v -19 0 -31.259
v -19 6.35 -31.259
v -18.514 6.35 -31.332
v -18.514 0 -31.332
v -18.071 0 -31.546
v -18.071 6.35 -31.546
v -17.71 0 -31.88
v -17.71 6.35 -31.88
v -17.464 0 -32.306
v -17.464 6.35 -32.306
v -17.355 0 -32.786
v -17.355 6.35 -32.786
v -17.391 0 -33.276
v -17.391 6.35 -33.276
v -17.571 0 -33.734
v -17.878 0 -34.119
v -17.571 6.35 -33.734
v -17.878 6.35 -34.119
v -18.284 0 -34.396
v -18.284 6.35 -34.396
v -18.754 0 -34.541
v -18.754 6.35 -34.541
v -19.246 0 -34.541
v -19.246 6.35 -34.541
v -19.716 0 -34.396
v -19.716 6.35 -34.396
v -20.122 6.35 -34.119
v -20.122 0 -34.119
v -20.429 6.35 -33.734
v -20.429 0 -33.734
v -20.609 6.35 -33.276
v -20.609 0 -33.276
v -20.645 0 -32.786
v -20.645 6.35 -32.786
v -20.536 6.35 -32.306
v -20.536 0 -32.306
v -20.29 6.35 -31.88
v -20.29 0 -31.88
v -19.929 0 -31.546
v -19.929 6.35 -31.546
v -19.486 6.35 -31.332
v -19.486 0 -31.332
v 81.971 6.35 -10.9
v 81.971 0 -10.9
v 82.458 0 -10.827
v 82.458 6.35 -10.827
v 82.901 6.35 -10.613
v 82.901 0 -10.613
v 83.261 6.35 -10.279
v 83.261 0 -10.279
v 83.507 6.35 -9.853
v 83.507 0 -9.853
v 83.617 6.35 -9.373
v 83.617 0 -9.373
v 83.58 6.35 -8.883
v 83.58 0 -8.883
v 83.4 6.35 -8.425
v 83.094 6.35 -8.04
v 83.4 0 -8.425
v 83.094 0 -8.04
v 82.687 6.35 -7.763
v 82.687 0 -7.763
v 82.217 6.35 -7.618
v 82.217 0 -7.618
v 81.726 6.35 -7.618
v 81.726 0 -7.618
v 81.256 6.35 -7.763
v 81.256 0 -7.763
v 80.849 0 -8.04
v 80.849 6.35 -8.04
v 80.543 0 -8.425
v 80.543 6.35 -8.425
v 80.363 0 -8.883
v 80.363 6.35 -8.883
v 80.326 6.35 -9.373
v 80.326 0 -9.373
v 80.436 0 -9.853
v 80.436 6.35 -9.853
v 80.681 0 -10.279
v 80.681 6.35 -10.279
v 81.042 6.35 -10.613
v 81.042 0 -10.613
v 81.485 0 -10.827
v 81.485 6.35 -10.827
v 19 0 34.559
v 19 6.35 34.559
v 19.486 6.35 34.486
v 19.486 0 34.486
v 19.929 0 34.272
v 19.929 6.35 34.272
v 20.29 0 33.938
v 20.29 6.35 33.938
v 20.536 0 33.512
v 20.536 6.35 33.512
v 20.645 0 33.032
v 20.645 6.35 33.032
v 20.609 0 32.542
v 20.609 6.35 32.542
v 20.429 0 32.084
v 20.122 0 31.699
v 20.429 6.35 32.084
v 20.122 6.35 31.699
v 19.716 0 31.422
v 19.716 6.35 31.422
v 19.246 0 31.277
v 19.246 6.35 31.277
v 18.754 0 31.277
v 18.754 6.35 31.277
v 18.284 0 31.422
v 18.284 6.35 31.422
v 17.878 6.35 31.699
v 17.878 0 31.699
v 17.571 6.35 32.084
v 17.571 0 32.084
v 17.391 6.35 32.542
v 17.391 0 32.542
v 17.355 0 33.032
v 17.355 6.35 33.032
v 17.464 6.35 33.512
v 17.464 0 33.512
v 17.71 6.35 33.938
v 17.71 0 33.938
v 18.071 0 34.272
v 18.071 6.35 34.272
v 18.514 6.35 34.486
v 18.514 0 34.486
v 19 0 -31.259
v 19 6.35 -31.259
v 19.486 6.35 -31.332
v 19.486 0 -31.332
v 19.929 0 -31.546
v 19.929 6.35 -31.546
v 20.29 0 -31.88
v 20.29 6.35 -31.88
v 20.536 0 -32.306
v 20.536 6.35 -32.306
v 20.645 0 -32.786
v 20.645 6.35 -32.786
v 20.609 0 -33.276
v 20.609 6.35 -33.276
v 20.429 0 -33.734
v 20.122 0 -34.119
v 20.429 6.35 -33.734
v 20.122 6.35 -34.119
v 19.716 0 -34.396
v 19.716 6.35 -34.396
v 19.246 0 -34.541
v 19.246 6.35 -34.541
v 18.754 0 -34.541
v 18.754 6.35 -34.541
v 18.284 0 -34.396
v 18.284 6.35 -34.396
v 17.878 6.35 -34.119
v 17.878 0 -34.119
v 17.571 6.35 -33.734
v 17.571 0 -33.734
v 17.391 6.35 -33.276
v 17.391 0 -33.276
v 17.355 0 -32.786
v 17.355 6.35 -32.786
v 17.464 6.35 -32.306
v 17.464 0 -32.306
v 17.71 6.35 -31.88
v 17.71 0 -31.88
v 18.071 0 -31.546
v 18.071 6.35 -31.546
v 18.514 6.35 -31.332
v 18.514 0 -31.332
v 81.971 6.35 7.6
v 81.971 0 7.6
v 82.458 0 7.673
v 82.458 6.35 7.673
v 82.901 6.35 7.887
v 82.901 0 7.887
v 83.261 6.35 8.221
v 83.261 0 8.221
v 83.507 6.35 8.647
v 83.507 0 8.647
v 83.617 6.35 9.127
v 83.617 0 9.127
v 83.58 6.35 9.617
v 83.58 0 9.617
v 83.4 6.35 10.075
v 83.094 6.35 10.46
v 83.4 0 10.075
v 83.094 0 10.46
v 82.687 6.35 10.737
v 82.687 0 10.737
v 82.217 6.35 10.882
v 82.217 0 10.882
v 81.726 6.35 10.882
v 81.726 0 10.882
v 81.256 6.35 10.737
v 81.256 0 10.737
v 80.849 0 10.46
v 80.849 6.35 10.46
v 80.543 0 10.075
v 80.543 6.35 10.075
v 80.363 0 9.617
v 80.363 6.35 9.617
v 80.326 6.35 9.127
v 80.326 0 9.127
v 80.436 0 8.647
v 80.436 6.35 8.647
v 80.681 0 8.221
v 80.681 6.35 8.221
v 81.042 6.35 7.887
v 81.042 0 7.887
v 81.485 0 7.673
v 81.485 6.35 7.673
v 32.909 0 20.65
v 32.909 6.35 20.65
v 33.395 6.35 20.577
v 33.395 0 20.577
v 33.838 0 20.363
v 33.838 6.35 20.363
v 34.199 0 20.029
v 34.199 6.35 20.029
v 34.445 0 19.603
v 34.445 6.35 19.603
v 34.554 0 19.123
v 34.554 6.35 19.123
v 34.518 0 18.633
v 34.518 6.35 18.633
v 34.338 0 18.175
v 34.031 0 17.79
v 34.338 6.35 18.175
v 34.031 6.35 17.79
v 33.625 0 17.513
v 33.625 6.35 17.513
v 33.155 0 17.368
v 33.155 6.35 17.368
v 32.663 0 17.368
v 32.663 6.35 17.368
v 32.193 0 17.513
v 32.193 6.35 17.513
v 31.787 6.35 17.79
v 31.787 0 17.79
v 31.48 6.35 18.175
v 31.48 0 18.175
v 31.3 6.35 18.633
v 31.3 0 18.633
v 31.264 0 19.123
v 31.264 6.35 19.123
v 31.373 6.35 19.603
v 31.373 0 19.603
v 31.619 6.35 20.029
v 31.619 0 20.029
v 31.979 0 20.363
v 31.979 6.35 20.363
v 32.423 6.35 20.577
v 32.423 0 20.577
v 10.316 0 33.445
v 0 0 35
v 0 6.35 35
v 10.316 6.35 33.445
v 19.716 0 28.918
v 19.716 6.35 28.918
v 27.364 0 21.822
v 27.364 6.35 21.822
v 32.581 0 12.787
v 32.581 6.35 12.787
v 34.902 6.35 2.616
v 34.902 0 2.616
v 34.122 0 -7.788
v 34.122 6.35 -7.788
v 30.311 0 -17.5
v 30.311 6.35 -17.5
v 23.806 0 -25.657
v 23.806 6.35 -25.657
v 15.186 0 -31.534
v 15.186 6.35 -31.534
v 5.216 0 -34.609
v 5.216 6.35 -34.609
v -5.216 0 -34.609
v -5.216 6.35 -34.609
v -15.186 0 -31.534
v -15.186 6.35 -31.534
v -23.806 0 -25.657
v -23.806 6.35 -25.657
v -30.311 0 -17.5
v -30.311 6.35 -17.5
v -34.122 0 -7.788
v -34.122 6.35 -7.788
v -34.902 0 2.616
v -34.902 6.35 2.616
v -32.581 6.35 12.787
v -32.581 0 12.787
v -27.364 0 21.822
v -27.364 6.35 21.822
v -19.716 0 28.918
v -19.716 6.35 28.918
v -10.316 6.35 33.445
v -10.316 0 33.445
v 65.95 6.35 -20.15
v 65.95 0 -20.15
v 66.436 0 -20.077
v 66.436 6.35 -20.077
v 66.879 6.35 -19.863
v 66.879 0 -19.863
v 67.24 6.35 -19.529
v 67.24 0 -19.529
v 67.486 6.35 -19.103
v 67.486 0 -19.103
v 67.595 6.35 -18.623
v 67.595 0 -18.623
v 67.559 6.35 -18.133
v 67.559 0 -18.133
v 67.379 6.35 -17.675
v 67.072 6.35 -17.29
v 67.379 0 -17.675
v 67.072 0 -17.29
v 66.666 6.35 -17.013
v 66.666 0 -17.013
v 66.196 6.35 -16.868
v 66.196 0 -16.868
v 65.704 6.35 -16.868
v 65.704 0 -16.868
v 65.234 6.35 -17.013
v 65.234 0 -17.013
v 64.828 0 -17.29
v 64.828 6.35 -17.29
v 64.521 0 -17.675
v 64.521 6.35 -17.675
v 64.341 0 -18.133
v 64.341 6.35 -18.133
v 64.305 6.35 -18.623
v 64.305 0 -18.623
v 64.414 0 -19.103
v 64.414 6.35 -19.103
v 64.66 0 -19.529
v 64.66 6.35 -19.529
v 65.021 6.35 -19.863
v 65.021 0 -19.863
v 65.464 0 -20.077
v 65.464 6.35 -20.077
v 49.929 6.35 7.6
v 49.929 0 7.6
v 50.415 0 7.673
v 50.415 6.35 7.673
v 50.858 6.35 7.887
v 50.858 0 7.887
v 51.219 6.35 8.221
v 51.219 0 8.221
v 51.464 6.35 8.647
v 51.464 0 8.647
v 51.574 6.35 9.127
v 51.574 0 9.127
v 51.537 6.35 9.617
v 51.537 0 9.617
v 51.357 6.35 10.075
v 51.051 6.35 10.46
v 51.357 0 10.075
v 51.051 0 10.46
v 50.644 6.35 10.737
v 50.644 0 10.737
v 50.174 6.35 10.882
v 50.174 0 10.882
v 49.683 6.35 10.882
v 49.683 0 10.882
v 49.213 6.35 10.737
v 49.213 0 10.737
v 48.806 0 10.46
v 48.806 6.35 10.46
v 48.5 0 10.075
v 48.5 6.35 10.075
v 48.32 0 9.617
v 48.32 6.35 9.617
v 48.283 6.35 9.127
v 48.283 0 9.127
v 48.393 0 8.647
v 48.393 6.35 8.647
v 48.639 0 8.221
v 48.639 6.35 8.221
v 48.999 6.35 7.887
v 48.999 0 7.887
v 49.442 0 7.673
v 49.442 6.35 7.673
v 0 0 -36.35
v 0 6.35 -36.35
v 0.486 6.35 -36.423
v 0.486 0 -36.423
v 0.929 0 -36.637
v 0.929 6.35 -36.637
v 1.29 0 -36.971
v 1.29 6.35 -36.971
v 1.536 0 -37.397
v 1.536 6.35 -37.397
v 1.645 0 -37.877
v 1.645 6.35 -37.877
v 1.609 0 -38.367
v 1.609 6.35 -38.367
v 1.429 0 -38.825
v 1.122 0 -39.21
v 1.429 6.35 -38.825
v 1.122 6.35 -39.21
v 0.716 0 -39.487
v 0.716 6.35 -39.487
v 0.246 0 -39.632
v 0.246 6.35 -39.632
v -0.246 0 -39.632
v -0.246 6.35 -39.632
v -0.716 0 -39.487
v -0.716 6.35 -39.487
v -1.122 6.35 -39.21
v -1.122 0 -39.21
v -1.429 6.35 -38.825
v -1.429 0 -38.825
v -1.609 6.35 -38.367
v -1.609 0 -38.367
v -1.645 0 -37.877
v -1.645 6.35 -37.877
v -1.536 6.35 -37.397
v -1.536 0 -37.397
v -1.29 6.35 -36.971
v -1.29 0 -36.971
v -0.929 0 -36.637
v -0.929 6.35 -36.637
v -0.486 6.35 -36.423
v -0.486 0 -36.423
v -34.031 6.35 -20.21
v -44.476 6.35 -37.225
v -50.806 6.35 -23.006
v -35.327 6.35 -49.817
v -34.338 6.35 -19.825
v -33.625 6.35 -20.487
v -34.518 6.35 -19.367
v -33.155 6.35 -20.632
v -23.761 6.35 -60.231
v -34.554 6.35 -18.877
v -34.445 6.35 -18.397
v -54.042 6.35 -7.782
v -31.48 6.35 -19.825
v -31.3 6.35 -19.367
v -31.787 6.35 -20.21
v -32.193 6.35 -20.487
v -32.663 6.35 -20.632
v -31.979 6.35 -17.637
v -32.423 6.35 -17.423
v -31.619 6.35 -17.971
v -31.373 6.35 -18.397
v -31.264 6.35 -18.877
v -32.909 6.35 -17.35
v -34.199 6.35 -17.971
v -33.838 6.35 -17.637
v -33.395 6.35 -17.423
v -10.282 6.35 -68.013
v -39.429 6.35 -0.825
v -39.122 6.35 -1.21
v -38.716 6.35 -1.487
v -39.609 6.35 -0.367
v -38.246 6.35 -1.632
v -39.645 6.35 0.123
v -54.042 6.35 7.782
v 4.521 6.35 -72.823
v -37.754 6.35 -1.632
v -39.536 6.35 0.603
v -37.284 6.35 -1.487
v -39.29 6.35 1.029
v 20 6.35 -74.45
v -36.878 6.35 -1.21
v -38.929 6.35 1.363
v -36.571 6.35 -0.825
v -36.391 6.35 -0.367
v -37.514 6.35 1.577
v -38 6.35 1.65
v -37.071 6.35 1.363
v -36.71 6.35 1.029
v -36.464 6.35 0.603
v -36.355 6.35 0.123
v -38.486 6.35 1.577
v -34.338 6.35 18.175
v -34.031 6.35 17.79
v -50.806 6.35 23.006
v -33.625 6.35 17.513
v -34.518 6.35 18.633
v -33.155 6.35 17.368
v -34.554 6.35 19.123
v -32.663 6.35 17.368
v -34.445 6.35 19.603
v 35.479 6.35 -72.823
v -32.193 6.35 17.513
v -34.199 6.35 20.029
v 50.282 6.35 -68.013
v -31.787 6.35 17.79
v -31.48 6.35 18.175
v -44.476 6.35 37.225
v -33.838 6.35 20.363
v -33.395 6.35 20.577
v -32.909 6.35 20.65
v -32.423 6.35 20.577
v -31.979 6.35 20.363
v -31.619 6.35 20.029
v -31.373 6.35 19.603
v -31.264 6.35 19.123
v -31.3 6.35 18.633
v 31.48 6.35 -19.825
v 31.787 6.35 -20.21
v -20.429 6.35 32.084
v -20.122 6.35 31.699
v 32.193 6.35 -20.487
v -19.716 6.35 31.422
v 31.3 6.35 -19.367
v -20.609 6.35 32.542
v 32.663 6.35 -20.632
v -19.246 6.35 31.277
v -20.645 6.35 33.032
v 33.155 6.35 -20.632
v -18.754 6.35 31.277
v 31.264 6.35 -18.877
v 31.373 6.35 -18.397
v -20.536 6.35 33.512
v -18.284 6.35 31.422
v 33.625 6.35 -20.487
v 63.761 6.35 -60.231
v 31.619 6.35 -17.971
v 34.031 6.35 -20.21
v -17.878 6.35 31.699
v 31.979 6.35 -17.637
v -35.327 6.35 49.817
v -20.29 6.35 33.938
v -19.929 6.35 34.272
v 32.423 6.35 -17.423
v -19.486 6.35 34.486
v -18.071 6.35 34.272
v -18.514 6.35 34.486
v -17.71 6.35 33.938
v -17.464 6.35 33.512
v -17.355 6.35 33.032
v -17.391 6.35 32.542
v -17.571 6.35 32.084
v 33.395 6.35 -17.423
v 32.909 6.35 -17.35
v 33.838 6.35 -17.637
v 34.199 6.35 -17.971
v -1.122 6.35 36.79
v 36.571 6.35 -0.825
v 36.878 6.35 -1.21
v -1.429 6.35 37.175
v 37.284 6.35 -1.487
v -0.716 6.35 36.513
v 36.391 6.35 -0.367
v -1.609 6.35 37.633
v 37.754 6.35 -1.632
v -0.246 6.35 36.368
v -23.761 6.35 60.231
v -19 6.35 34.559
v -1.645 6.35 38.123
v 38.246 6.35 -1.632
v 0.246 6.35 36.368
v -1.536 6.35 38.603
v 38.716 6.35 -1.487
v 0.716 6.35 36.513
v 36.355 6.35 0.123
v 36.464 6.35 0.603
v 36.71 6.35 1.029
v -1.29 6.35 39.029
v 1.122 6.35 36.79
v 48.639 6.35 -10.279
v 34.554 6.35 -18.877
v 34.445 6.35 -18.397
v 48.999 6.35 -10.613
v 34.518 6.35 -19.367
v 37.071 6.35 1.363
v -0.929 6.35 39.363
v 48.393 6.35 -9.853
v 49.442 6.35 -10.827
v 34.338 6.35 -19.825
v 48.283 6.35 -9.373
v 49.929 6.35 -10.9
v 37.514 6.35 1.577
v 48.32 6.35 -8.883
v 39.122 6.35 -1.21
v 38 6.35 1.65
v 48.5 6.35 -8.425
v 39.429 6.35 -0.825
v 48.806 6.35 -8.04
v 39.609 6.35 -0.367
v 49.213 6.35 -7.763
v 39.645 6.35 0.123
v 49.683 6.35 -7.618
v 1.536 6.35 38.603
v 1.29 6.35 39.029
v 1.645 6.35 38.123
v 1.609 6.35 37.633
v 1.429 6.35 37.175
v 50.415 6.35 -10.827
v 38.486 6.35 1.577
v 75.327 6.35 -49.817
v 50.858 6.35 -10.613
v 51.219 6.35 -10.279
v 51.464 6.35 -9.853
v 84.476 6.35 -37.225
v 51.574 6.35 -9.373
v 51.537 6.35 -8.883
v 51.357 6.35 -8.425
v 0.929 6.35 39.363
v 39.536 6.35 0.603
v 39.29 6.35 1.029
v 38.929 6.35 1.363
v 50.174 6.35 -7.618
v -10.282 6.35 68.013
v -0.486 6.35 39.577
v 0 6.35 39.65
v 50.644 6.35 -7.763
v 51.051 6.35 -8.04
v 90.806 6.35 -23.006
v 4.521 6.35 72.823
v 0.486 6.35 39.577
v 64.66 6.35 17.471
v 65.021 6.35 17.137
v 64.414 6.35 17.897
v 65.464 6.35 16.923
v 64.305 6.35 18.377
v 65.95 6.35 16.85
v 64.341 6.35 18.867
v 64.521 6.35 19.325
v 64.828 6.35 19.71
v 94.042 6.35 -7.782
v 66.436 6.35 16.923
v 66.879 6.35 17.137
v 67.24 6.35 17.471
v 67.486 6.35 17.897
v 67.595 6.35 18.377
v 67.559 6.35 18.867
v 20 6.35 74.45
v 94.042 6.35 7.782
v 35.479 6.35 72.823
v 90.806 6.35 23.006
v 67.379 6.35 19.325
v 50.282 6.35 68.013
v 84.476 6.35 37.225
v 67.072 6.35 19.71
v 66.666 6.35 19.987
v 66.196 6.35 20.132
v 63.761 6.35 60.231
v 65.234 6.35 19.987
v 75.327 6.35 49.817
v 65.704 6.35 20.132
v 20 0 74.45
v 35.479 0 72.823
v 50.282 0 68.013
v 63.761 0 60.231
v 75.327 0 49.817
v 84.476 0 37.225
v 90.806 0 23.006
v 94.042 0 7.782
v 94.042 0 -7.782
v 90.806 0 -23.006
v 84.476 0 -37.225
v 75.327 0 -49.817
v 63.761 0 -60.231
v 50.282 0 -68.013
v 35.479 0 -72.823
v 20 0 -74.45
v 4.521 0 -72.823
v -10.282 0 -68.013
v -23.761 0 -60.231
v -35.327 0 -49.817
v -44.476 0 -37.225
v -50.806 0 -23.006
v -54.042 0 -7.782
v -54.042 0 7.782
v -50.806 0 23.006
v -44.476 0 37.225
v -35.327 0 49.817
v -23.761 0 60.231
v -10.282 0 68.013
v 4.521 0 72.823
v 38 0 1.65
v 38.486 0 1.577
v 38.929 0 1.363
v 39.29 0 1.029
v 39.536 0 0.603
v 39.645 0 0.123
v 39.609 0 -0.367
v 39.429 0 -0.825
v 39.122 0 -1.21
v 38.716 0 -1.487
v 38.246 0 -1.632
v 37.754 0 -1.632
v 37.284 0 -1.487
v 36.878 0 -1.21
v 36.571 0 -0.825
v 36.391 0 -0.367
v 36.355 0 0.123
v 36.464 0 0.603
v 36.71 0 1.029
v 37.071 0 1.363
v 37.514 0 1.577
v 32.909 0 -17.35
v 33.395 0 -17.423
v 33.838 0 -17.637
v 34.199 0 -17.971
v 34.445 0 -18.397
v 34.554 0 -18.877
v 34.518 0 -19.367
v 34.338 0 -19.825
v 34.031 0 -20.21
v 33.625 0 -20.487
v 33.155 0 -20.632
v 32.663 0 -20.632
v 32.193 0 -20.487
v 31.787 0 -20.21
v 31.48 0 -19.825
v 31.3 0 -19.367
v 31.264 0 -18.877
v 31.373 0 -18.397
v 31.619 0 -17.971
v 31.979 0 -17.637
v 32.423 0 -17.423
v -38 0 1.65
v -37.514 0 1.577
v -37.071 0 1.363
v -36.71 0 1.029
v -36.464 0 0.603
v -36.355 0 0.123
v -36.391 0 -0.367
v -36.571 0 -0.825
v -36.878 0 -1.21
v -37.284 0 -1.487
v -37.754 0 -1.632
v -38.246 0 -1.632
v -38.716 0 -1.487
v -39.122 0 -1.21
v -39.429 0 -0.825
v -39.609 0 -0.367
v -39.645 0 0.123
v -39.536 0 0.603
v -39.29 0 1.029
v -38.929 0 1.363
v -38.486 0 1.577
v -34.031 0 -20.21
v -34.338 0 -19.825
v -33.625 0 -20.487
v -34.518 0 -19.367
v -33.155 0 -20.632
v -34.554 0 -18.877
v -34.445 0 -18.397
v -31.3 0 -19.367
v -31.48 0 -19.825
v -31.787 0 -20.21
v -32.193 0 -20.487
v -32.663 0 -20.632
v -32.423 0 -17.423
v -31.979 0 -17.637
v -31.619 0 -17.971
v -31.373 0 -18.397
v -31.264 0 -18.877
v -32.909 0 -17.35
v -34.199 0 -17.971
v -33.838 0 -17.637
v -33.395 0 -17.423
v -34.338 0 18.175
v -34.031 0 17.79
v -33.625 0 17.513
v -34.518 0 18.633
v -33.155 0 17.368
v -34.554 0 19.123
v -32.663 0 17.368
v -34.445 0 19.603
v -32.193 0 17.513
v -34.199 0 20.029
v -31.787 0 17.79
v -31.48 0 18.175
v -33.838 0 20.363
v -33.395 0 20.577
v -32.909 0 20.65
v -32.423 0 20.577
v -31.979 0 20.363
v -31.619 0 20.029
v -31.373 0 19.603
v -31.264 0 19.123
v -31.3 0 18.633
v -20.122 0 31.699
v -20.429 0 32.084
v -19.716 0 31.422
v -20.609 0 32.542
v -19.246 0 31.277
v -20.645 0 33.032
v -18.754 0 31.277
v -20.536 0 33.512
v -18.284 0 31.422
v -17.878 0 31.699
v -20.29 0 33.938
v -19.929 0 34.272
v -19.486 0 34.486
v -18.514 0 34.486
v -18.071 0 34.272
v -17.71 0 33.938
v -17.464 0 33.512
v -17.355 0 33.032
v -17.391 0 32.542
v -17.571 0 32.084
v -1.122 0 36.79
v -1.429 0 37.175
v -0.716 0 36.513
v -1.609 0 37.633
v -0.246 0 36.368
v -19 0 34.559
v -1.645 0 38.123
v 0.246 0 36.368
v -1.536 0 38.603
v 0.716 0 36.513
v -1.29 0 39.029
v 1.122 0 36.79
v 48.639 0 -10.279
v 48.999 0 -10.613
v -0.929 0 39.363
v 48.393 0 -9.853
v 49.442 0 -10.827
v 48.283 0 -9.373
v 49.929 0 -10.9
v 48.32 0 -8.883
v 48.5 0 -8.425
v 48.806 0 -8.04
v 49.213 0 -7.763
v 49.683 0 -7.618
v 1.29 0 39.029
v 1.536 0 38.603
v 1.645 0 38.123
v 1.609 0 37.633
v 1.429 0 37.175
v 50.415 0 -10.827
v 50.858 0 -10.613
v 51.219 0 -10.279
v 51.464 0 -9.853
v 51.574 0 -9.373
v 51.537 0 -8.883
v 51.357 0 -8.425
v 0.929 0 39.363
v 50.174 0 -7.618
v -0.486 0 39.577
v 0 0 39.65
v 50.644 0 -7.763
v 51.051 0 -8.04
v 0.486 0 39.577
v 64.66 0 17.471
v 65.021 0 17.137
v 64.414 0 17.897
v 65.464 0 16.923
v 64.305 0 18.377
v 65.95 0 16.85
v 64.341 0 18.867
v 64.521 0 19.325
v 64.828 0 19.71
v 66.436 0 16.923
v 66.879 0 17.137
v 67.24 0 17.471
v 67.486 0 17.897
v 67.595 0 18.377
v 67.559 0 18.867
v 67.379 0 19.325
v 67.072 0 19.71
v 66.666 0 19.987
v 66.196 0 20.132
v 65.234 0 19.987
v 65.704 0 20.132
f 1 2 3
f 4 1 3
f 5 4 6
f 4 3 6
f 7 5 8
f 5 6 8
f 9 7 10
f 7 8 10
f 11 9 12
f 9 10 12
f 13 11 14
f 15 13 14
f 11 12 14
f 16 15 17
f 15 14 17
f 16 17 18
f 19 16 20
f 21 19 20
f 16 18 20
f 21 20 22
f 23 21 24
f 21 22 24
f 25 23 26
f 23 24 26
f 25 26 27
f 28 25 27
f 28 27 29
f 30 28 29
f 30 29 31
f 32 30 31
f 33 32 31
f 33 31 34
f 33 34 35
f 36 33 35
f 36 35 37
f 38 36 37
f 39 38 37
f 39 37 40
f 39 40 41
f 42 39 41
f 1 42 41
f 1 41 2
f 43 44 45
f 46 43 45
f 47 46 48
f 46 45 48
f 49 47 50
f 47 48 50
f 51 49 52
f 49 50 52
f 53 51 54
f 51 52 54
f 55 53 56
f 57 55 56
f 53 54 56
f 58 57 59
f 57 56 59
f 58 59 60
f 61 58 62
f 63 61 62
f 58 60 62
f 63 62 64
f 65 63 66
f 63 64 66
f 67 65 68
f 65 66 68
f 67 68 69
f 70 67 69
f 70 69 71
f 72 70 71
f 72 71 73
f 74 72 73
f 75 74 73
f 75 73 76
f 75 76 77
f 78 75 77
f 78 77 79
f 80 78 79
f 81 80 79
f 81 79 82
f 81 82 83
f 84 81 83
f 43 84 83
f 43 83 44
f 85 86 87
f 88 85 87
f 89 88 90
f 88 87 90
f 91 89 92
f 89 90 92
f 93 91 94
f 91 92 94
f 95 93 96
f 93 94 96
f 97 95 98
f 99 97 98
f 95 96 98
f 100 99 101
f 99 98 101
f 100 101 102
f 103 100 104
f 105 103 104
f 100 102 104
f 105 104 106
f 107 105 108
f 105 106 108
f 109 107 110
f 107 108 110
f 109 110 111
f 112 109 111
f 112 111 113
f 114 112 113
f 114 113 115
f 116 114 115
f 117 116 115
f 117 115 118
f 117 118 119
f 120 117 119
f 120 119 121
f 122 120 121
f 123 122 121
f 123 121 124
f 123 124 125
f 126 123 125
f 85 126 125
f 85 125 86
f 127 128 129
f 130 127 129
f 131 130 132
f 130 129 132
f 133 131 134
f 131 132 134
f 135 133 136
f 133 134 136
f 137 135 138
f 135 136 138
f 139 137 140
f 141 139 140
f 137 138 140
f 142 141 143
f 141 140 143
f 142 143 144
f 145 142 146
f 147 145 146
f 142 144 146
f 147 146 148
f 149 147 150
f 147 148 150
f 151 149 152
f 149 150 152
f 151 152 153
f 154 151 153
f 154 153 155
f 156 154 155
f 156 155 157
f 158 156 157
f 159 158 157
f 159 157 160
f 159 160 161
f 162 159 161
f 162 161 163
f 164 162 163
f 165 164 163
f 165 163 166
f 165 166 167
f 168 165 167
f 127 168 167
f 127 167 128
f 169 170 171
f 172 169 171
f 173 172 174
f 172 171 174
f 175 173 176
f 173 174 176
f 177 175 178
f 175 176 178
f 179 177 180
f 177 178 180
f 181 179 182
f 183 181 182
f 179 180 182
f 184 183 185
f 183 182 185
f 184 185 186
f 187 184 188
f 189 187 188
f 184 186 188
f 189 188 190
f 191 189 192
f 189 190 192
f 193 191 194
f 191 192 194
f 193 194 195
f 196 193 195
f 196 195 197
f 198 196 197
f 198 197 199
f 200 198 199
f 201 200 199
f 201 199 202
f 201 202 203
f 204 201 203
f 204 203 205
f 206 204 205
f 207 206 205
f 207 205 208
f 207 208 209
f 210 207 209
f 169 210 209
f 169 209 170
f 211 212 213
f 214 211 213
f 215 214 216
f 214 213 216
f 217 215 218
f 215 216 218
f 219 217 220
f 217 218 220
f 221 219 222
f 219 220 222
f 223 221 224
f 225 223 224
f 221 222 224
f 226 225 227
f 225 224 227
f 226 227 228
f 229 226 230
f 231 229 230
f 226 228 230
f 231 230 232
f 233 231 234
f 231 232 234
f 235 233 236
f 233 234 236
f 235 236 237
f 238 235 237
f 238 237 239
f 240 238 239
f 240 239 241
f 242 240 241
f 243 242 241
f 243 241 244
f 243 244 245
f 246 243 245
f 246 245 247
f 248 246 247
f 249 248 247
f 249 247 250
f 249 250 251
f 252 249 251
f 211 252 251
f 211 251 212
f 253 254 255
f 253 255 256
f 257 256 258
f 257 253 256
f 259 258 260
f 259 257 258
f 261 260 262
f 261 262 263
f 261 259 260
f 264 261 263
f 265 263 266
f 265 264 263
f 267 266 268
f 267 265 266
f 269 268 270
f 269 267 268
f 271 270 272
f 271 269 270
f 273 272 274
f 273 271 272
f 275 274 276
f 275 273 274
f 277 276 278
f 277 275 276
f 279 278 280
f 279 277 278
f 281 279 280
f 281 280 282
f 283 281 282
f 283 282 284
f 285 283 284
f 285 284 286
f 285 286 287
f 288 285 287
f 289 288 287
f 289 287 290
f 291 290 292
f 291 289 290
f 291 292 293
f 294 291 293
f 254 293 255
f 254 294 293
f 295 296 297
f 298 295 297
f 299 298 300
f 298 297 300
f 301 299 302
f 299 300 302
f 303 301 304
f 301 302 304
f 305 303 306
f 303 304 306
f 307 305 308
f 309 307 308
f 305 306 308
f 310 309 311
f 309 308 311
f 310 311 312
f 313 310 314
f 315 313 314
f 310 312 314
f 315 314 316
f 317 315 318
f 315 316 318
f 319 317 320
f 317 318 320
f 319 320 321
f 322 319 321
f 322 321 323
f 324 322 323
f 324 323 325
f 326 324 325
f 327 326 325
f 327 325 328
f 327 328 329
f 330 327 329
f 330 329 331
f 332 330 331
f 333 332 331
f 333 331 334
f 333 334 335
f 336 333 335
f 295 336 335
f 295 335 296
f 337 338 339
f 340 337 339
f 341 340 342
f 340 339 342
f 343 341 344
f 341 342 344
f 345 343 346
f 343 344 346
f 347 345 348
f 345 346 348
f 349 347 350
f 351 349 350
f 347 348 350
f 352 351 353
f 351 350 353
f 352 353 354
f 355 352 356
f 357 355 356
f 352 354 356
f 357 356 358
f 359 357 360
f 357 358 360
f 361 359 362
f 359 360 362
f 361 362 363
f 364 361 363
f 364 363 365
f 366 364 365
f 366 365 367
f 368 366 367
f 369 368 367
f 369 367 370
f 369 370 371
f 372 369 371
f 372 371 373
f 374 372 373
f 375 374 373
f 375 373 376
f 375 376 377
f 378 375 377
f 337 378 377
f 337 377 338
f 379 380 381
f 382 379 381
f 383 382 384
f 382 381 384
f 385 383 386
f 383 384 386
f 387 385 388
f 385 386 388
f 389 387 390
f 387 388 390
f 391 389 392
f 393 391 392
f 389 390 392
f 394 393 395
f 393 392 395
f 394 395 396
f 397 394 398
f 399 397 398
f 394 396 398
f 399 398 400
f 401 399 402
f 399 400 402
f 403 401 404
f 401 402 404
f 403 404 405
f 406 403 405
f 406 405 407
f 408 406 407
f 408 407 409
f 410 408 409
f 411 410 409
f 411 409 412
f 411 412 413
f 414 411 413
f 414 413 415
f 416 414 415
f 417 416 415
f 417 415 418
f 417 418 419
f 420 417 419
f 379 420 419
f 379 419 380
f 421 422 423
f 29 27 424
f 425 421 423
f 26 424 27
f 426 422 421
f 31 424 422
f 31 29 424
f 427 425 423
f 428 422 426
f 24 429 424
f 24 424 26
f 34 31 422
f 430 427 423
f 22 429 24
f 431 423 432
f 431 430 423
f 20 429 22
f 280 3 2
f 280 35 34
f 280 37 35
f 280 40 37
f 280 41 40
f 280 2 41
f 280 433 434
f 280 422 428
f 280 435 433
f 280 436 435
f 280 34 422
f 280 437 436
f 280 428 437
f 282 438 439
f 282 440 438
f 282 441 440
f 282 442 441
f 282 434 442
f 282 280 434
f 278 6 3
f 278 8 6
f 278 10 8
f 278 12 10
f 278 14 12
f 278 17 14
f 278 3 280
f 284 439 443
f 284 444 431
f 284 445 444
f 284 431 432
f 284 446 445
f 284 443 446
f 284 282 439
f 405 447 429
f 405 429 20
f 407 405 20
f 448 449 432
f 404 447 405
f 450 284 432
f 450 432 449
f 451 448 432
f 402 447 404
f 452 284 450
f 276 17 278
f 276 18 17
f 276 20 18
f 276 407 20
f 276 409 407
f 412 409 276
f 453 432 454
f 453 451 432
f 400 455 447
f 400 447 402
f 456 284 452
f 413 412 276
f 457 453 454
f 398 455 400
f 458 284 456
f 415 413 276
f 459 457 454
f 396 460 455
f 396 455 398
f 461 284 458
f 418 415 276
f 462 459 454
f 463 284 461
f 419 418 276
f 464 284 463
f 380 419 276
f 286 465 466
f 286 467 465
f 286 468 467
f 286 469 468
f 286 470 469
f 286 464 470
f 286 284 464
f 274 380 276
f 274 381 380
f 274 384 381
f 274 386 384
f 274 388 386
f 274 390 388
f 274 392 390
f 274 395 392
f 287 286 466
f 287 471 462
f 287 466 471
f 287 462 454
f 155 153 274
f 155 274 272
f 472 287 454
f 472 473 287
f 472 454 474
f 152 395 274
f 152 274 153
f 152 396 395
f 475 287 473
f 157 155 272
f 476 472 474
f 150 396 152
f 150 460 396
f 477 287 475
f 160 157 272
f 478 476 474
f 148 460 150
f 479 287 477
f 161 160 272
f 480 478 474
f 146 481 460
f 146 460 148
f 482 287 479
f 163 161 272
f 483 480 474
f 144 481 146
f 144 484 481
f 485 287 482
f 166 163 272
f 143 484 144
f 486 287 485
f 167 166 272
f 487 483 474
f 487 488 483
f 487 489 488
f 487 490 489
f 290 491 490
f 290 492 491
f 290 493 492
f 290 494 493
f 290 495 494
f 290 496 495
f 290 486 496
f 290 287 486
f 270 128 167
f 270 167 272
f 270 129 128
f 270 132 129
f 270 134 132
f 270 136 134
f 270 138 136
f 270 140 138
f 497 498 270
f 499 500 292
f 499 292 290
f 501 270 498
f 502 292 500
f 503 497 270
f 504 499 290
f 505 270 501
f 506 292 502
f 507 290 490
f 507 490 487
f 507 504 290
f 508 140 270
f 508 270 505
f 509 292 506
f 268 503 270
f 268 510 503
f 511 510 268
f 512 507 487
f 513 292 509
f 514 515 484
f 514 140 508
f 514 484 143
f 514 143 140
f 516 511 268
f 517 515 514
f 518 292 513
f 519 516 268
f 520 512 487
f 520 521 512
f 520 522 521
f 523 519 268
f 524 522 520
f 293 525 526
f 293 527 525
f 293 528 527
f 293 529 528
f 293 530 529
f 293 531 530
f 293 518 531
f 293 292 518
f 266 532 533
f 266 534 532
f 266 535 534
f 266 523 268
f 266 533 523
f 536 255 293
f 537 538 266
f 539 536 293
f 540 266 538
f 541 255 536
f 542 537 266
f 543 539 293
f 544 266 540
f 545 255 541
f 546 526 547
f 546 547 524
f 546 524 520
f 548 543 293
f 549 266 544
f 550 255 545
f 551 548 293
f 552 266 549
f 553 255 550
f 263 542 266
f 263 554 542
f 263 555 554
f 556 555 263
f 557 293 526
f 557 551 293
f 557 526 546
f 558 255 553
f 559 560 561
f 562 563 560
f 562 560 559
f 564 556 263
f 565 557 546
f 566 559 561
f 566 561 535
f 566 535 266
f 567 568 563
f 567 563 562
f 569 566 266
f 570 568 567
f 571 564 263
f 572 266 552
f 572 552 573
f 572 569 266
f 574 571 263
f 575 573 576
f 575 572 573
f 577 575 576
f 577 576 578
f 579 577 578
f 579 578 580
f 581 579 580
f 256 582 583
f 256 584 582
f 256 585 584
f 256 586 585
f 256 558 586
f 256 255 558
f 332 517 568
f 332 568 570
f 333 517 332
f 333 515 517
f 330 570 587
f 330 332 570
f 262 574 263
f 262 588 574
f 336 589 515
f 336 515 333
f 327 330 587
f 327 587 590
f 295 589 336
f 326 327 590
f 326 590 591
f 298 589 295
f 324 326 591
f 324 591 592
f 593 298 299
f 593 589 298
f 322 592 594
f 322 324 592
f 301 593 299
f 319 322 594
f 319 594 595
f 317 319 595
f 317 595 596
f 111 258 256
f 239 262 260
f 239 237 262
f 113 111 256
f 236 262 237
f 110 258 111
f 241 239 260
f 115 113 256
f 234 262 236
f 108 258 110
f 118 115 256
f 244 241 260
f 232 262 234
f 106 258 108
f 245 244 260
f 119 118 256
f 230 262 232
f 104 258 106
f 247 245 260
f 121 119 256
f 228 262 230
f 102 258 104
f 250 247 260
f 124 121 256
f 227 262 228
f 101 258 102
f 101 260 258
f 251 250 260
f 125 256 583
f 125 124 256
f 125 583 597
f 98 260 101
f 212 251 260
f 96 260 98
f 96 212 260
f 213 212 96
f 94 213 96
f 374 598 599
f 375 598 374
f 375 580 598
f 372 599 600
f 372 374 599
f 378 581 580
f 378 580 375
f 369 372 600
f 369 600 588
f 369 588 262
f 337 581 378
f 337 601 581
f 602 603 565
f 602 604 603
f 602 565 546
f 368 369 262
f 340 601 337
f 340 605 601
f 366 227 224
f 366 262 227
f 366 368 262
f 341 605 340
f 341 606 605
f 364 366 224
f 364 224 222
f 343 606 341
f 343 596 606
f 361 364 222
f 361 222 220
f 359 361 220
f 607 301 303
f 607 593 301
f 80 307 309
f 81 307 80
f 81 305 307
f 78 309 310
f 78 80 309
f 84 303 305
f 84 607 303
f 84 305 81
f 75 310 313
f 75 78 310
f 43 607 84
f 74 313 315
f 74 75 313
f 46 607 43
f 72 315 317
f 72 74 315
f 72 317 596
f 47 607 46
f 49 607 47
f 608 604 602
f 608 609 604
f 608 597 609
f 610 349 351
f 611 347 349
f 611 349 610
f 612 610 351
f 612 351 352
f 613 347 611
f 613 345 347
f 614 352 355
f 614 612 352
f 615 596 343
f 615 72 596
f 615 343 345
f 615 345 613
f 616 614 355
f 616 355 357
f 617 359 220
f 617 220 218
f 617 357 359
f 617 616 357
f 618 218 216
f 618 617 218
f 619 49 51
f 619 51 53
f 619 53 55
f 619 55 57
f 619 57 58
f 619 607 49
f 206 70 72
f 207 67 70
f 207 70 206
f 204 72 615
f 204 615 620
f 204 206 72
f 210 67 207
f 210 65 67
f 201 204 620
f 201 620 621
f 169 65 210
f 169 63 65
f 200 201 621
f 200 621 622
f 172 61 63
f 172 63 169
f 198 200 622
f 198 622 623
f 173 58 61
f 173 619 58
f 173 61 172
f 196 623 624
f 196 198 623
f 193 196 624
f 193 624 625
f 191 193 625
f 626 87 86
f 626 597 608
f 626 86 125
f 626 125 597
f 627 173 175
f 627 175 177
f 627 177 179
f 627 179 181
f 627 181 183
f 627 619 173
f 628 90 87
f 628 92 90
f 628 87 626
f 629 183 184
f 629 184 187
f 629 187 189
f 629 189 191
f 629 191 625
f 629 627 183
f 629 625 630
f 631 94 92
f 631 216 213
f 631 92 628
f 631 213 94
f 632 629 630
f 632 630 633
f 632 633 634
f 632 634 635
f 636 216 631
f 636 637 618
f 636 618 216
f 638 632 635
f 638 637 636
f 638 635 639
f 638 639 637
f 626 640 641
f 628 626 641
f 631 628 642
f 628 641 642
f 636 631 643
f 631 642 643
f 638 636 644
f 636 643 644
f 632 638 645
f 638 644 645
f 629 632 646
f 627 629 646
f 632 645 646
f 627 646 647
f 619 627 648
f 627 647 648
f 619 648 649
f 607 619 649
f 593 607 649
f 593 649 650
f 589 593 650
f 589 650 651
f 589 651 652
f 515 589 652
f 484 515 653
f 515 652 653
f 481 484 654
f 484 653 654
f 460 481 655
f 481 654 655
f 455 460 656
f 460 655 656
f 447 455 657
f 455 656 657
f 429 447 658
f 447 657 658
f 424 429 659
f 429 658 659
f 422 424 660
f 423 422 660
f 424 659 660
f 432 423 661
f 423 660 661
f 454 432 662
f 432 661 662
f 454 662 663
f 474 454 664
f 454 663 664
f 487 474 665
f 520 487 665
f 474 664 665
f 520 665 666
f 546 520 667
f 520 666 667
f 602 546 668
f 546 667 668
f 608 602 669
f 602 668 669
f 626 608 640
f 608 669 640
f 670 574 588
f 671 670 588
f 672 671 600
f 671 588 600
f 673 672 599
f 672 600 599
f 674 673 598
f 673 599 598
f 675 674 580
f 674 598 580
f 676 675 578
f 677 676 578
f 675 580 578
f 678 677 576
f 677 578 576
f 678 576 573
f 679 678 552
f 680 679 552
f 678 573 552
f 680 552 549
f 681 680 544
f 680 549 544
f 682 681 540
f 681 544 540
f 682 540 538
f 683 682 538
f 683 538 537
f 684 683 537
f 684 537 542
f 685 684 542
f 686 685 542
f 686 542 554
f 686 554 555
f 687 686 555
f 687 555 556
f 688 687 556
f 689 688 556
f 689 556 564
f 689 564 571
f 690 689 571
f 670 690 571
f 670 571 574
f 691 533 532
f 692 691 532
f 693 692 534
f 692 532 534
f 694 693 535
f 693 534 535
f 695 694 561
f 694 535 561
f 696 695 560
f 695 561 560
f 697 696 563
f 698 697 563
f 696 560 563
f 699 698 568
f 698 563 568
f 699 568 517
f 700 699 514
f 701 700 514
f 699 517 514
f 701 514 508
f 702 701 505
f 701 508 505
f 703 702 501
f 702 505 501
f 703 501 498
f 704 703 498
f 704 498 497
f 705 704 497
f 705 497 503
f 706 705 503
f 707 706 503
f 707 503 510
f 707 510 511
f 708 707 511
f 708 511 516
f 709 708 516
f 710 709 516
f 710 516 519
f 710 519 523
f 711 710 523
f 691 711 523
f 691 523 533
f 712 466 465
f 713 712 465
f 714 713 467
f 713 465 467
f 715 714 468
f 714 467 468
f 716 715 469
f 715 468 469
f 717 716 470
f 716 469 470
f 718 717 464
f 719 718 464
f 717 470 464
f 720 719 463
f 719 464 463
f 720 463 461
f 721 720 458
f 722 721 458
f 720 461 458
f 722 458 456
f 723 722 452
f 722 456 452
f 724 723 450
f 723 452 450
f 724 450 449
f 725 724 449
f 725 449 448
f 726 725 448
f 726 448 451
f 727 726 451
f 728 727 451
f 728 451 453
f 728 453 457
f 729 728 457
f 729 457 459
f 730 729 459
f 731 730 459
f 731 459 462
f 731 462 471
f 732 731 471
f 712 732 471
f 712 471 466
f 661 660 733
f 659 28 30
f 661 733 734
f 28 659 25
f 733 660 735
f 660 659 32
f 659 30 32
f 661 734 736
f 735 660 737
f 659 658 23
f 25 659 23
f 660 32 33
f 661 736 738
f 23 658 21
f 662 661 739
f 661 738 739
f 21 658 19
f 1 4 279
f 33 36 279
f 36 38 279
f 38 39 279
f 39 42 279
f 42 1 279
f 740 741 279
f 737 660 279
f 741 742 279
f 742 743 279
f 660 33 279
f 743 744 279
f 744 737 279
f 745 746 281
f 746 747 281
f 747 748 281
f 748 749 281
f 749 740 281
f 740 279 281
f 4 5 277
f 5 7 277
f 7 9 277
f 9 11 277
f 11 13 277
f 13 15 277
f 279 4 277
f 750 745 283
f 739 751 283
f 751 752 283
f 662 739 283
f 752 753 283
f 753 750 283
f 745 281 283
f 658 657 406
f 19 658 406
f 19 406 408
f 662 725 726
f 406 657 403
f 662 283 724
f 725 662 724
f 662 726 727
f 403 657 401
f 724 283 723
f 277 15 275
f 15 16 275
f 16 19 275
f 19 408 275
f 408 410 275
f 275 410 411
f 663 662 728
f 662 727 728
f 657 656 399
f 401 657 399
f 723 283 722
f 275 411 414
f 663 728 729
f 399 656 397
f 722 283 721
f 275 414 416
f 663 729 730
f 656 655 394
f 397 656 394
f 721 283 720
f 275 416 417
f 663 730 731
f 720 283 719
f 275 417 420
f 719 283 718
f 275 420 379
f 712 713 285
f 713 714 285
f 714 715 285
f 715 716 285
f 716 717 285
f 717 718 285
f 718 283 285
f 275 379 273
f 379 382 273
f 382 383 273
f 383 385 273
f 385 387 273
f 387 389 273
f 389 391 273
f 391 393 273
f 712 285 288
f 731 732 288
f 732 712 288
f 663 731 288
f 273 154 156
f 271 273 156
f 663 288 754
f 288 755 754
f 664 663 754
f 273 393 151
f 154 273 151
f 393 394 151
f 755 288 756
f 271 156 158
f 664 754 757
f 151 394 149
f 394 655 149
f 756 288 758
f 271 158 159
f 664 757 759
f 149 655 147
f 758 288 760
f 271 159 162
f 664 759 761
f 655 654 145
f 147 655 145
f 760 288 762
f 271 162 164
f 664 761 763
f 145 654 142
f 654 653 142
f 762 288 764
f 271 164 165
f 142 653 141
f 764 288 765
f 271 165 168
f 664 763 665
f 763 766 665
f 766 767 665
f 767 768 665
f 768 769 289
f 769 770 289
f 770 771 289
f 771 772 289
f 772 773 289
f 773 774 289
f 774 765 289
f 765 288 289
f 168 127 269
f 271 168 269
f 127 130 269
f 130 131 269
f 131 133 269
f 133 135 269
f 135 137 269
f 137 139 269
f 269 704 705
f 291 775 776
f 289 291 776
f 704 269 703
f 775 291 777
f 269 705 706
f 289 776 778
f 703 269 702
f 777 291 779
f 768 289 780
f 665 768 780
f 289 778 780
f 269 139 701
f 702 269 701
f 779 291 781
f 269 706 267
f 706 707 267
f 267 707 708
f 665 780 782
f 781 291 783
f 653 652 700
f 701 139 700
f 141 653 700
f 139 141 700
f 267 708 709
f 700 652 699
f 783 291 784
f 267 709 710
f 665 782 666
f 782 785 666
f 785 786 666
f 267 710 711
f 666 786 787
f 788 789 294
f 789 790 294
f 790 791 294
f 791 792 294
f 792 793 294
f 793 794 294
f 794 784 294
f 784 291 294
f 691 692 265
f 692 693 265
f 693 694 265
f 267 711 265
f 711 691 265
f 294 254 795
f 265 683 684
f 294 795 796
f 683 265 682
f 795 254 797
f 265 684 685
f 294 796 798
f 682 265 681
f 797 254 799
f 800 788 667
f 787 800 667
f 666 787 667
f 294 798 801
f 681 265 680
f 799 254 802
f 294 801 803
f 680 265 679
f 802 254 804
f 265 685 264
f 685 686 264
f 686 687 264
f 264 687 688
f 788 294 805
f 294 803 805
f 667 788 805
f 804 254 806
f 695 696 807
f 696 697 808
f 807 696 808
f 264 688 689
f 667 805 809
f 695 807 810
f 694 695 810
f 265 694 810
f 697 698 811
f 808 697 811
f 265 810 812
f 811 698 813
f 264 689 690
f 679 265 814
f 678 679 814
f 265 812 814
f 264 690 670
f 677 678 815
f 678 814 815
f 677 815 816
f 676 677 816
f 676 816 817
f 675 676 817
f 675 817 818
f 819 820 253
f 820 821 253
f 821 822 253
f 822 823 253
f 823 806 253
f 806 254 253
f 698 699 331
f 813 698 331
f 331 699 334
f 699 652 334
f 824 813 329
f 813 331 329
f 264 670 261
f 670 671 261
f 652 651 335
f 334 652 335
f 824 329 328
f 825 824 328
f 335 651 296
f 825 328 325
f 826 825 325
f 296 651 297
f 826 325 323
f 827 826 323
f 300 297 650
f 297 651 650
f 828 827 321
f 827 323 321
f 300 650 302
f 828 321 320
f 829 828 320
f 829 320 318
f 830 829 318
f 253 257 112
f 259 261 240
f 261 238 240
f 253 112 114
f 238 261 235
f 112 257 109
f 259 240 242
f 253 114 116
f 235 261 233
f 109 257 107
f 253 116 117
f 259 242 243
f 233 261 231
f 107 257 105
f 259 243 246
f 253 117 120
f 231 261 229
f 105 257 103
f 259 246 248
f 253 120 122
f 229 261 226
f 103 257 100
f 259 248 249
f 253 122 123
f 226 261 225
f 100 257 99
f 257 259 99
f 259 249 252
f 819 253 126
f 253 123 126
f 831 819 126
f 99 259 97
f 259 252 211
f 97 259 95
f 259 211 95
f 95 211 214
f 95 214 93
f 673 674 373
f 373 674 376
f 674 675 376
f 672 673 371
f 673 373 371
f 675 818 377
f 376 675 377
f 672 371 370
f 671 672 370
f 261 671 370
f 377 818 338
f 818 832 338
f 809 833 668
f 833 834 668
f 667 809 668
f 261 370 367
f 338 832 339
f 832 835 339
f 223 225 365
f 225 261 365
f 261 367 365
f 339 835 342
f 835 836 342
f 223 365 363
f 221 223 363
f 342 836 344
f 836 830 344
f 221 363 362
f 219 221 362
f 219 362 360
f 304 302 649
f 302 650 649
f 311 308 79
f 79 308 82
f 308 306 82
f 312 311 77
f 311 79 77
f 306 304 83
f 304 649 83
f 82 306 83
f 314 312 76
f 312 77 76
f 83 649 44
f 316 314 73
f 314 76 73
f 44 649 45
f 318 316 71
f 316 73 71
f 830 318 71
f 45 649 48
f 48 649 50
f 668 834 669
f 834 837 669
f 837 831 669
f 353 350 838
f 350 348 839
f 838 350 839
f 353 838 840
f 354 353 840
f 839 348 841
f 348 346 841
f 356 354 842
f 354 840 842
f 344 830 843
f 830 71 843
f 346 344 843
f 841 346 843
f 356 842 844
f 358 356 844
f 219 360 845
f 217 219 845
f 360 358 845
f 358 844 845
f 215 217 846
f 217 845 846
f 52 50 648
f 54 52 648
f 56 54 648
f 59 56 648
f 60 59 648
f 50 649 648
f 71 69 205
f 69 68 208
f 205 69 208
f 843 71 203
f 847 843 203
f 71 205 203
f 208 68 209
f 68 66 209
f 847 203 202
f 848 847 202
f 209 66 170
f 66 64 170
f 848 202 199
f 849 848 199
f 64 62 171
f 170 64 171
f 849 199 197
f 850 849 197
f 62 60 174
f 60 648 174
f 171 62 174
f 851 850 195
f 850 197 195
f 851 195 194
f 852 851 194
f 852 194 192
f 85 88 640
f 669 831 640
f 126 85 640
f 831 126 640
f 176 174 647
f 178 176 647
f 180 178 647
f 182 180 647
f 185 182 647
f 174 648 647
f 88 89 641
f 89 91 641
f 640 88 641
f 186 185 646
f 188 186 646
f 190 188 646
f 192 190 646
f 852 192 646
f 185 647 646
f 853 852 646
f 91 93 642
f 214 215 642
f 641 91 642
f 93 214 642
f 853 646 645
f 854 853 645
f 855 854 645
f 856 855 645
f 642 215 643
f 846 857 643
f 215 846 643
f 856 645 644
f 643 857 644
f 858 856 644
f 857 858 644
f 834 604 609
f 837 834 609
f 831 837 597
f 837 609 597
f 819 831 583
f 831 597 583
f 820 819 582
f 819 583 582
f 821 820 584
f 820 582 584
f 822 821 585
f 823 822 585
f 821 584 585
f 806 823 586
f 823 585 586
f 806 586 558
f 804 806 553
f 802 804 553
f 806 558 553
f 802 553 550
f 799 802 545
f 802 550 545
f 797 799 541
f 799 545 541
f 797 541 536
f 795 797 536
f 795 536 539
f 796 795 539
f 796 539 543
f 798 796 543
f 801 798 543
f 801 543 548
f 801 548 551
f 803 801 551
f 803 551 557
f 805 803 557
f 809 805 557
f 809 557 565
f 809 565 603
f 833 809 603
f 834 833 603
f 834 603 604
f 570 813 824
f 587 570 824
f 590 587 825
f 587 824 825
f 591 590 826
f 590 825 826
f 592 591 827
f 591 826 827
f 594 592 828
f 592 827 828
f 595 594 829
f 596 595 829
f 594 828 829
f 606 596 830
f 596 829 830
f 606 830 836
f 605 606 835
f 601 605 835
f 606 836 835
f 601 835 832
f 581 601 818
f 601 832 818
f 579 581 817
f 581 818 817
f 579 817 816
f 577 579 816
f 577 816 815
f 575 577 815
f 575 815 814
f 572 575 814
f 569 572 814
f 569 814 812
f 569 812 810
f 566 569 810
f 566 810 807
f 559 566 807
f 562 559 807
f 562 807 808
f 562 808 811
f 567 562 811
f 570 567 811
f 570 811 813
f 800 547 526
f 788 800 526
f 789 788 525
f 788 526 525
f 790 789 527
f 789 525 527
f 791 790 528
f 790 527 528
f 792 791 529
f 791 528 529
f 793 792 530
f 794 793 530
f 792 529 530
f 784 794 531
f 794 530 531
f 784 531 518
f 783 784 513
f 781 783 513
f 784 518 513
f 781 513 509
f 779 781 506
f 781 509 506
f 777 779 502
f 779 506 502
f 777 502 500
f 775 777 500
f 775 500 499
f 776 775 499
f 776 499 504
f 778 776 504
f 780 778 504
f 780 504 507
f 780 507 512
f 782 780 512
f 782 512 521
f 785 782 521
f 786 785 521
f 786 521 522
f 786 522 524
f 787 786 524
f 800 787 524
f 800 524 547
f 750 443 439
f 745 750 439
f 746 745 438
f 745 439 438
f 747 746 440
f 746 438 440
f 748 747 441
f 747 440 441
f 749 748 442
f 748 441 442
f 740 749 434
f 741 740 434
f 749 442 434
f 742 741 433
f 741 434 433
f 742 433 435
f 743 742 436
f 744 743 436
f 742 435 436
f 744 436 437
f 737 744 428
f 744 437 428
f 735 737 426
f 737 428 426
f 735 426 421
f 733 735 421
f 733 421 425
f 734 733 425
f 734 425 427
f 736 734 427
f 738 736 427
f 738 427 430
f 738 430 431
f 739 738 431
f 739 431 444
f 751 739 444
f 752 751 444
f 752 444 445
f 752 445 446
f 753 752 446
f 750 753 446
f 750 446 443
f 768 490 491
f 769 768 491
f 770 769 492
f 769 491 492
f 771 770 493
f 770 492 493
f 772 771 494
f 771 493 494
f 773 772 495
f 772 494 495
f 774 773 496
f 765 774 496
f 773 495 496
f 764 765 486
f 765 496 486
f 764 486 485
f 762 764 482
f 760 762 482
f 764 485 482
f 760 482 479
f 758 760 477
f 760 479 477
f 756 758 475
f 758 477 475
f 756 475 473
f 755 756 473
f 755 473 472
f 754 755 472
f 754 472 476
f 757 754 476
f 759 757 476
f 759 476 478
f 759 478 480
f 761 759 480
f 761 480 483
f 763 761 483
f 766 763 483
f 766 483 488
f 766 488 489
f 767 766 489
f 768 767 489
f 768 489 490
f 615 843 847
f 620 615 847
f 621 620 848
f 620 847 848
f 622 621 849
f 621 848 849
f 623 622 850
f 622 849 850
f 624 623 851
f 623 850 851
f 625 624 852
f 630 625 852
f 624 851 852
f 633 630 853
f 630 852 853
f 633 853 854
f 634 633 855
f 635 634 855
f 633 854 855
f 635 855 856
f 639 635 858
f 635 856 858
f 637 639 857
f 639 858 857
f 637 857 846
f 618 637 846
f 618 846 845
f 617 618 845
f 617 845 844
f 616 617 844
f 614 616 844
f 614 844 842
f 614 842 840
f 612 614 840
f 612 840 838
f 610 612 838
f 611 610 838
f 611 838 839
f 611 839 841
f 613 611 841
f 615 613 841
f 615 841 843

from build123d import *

# Parameters (mm, degrees)
SKETCH1_R                       = 74.45
SKETCH1_R_2                     = 35
BOSS_EXTRUDE1_DEPTH             = 6.35
M4X0_7_TAPPED_HOLE1_D           = 3.3
M4X0_7_TAPPED_HOLE1_ON_FACE_2_D = 3.3


with BuildPart() as part:
    # Sketch1 → Boss-Extrude1 (new body)
    with BuildSketch(Plane(origin=(0, 0, 0), x_dir=(1, 0, 0), z_dir=(0, 1, 0))):
        with Locations(Location((20, 0, 0), (0, 0, 270))):
            Circle(SKETCH1_R)
        with Locations(Location((0, 0, 0), (0, 0, 270))):
            Circle(SKETCH1_R_2, mode=Mode.SUBTRACT)
    extrude(amount=BOSS_EXTRUDE1_DEPTH)

    # M4x0.7 Tapped Hole1 (through all)
    with Locations(Plane(origin=(0, 0, -38), x_dir=(0, 0, -1), z_dir=(0, -1, 0))):
        with Locations((0, 0), (-5.091034656, -19), (-19, -32.908965344), (-38, -38), (-57, -32.908965344), (-70.908965344, -19), (-76, 0), (-70.908965344, 19), (-57, 32.908965344), (-38, 38), (-5.091034656, 19), (-19, 32.908965344)):
            Hole(M4X0_7_TAPPED_HOLE1_D / 2)

    # M4x0.7 Tapped Hole1 on face 2 (through all)
    with Locations(Plane(origin=(65.95, 6.35, -18.5), x_dir=(0, 0, 1), z_dir=(0, 1, 0))):
        with Locations((0, 0), (9.25, 16.02146997), (27.75, 16.02146997), (37, 0), (27.75, -16.02146997), (9.25, -16.02146997)):
            Hole(M4X0_7_TAPPED_HOLE1_ON_FACE_2_D / 2)


solid = part.part
